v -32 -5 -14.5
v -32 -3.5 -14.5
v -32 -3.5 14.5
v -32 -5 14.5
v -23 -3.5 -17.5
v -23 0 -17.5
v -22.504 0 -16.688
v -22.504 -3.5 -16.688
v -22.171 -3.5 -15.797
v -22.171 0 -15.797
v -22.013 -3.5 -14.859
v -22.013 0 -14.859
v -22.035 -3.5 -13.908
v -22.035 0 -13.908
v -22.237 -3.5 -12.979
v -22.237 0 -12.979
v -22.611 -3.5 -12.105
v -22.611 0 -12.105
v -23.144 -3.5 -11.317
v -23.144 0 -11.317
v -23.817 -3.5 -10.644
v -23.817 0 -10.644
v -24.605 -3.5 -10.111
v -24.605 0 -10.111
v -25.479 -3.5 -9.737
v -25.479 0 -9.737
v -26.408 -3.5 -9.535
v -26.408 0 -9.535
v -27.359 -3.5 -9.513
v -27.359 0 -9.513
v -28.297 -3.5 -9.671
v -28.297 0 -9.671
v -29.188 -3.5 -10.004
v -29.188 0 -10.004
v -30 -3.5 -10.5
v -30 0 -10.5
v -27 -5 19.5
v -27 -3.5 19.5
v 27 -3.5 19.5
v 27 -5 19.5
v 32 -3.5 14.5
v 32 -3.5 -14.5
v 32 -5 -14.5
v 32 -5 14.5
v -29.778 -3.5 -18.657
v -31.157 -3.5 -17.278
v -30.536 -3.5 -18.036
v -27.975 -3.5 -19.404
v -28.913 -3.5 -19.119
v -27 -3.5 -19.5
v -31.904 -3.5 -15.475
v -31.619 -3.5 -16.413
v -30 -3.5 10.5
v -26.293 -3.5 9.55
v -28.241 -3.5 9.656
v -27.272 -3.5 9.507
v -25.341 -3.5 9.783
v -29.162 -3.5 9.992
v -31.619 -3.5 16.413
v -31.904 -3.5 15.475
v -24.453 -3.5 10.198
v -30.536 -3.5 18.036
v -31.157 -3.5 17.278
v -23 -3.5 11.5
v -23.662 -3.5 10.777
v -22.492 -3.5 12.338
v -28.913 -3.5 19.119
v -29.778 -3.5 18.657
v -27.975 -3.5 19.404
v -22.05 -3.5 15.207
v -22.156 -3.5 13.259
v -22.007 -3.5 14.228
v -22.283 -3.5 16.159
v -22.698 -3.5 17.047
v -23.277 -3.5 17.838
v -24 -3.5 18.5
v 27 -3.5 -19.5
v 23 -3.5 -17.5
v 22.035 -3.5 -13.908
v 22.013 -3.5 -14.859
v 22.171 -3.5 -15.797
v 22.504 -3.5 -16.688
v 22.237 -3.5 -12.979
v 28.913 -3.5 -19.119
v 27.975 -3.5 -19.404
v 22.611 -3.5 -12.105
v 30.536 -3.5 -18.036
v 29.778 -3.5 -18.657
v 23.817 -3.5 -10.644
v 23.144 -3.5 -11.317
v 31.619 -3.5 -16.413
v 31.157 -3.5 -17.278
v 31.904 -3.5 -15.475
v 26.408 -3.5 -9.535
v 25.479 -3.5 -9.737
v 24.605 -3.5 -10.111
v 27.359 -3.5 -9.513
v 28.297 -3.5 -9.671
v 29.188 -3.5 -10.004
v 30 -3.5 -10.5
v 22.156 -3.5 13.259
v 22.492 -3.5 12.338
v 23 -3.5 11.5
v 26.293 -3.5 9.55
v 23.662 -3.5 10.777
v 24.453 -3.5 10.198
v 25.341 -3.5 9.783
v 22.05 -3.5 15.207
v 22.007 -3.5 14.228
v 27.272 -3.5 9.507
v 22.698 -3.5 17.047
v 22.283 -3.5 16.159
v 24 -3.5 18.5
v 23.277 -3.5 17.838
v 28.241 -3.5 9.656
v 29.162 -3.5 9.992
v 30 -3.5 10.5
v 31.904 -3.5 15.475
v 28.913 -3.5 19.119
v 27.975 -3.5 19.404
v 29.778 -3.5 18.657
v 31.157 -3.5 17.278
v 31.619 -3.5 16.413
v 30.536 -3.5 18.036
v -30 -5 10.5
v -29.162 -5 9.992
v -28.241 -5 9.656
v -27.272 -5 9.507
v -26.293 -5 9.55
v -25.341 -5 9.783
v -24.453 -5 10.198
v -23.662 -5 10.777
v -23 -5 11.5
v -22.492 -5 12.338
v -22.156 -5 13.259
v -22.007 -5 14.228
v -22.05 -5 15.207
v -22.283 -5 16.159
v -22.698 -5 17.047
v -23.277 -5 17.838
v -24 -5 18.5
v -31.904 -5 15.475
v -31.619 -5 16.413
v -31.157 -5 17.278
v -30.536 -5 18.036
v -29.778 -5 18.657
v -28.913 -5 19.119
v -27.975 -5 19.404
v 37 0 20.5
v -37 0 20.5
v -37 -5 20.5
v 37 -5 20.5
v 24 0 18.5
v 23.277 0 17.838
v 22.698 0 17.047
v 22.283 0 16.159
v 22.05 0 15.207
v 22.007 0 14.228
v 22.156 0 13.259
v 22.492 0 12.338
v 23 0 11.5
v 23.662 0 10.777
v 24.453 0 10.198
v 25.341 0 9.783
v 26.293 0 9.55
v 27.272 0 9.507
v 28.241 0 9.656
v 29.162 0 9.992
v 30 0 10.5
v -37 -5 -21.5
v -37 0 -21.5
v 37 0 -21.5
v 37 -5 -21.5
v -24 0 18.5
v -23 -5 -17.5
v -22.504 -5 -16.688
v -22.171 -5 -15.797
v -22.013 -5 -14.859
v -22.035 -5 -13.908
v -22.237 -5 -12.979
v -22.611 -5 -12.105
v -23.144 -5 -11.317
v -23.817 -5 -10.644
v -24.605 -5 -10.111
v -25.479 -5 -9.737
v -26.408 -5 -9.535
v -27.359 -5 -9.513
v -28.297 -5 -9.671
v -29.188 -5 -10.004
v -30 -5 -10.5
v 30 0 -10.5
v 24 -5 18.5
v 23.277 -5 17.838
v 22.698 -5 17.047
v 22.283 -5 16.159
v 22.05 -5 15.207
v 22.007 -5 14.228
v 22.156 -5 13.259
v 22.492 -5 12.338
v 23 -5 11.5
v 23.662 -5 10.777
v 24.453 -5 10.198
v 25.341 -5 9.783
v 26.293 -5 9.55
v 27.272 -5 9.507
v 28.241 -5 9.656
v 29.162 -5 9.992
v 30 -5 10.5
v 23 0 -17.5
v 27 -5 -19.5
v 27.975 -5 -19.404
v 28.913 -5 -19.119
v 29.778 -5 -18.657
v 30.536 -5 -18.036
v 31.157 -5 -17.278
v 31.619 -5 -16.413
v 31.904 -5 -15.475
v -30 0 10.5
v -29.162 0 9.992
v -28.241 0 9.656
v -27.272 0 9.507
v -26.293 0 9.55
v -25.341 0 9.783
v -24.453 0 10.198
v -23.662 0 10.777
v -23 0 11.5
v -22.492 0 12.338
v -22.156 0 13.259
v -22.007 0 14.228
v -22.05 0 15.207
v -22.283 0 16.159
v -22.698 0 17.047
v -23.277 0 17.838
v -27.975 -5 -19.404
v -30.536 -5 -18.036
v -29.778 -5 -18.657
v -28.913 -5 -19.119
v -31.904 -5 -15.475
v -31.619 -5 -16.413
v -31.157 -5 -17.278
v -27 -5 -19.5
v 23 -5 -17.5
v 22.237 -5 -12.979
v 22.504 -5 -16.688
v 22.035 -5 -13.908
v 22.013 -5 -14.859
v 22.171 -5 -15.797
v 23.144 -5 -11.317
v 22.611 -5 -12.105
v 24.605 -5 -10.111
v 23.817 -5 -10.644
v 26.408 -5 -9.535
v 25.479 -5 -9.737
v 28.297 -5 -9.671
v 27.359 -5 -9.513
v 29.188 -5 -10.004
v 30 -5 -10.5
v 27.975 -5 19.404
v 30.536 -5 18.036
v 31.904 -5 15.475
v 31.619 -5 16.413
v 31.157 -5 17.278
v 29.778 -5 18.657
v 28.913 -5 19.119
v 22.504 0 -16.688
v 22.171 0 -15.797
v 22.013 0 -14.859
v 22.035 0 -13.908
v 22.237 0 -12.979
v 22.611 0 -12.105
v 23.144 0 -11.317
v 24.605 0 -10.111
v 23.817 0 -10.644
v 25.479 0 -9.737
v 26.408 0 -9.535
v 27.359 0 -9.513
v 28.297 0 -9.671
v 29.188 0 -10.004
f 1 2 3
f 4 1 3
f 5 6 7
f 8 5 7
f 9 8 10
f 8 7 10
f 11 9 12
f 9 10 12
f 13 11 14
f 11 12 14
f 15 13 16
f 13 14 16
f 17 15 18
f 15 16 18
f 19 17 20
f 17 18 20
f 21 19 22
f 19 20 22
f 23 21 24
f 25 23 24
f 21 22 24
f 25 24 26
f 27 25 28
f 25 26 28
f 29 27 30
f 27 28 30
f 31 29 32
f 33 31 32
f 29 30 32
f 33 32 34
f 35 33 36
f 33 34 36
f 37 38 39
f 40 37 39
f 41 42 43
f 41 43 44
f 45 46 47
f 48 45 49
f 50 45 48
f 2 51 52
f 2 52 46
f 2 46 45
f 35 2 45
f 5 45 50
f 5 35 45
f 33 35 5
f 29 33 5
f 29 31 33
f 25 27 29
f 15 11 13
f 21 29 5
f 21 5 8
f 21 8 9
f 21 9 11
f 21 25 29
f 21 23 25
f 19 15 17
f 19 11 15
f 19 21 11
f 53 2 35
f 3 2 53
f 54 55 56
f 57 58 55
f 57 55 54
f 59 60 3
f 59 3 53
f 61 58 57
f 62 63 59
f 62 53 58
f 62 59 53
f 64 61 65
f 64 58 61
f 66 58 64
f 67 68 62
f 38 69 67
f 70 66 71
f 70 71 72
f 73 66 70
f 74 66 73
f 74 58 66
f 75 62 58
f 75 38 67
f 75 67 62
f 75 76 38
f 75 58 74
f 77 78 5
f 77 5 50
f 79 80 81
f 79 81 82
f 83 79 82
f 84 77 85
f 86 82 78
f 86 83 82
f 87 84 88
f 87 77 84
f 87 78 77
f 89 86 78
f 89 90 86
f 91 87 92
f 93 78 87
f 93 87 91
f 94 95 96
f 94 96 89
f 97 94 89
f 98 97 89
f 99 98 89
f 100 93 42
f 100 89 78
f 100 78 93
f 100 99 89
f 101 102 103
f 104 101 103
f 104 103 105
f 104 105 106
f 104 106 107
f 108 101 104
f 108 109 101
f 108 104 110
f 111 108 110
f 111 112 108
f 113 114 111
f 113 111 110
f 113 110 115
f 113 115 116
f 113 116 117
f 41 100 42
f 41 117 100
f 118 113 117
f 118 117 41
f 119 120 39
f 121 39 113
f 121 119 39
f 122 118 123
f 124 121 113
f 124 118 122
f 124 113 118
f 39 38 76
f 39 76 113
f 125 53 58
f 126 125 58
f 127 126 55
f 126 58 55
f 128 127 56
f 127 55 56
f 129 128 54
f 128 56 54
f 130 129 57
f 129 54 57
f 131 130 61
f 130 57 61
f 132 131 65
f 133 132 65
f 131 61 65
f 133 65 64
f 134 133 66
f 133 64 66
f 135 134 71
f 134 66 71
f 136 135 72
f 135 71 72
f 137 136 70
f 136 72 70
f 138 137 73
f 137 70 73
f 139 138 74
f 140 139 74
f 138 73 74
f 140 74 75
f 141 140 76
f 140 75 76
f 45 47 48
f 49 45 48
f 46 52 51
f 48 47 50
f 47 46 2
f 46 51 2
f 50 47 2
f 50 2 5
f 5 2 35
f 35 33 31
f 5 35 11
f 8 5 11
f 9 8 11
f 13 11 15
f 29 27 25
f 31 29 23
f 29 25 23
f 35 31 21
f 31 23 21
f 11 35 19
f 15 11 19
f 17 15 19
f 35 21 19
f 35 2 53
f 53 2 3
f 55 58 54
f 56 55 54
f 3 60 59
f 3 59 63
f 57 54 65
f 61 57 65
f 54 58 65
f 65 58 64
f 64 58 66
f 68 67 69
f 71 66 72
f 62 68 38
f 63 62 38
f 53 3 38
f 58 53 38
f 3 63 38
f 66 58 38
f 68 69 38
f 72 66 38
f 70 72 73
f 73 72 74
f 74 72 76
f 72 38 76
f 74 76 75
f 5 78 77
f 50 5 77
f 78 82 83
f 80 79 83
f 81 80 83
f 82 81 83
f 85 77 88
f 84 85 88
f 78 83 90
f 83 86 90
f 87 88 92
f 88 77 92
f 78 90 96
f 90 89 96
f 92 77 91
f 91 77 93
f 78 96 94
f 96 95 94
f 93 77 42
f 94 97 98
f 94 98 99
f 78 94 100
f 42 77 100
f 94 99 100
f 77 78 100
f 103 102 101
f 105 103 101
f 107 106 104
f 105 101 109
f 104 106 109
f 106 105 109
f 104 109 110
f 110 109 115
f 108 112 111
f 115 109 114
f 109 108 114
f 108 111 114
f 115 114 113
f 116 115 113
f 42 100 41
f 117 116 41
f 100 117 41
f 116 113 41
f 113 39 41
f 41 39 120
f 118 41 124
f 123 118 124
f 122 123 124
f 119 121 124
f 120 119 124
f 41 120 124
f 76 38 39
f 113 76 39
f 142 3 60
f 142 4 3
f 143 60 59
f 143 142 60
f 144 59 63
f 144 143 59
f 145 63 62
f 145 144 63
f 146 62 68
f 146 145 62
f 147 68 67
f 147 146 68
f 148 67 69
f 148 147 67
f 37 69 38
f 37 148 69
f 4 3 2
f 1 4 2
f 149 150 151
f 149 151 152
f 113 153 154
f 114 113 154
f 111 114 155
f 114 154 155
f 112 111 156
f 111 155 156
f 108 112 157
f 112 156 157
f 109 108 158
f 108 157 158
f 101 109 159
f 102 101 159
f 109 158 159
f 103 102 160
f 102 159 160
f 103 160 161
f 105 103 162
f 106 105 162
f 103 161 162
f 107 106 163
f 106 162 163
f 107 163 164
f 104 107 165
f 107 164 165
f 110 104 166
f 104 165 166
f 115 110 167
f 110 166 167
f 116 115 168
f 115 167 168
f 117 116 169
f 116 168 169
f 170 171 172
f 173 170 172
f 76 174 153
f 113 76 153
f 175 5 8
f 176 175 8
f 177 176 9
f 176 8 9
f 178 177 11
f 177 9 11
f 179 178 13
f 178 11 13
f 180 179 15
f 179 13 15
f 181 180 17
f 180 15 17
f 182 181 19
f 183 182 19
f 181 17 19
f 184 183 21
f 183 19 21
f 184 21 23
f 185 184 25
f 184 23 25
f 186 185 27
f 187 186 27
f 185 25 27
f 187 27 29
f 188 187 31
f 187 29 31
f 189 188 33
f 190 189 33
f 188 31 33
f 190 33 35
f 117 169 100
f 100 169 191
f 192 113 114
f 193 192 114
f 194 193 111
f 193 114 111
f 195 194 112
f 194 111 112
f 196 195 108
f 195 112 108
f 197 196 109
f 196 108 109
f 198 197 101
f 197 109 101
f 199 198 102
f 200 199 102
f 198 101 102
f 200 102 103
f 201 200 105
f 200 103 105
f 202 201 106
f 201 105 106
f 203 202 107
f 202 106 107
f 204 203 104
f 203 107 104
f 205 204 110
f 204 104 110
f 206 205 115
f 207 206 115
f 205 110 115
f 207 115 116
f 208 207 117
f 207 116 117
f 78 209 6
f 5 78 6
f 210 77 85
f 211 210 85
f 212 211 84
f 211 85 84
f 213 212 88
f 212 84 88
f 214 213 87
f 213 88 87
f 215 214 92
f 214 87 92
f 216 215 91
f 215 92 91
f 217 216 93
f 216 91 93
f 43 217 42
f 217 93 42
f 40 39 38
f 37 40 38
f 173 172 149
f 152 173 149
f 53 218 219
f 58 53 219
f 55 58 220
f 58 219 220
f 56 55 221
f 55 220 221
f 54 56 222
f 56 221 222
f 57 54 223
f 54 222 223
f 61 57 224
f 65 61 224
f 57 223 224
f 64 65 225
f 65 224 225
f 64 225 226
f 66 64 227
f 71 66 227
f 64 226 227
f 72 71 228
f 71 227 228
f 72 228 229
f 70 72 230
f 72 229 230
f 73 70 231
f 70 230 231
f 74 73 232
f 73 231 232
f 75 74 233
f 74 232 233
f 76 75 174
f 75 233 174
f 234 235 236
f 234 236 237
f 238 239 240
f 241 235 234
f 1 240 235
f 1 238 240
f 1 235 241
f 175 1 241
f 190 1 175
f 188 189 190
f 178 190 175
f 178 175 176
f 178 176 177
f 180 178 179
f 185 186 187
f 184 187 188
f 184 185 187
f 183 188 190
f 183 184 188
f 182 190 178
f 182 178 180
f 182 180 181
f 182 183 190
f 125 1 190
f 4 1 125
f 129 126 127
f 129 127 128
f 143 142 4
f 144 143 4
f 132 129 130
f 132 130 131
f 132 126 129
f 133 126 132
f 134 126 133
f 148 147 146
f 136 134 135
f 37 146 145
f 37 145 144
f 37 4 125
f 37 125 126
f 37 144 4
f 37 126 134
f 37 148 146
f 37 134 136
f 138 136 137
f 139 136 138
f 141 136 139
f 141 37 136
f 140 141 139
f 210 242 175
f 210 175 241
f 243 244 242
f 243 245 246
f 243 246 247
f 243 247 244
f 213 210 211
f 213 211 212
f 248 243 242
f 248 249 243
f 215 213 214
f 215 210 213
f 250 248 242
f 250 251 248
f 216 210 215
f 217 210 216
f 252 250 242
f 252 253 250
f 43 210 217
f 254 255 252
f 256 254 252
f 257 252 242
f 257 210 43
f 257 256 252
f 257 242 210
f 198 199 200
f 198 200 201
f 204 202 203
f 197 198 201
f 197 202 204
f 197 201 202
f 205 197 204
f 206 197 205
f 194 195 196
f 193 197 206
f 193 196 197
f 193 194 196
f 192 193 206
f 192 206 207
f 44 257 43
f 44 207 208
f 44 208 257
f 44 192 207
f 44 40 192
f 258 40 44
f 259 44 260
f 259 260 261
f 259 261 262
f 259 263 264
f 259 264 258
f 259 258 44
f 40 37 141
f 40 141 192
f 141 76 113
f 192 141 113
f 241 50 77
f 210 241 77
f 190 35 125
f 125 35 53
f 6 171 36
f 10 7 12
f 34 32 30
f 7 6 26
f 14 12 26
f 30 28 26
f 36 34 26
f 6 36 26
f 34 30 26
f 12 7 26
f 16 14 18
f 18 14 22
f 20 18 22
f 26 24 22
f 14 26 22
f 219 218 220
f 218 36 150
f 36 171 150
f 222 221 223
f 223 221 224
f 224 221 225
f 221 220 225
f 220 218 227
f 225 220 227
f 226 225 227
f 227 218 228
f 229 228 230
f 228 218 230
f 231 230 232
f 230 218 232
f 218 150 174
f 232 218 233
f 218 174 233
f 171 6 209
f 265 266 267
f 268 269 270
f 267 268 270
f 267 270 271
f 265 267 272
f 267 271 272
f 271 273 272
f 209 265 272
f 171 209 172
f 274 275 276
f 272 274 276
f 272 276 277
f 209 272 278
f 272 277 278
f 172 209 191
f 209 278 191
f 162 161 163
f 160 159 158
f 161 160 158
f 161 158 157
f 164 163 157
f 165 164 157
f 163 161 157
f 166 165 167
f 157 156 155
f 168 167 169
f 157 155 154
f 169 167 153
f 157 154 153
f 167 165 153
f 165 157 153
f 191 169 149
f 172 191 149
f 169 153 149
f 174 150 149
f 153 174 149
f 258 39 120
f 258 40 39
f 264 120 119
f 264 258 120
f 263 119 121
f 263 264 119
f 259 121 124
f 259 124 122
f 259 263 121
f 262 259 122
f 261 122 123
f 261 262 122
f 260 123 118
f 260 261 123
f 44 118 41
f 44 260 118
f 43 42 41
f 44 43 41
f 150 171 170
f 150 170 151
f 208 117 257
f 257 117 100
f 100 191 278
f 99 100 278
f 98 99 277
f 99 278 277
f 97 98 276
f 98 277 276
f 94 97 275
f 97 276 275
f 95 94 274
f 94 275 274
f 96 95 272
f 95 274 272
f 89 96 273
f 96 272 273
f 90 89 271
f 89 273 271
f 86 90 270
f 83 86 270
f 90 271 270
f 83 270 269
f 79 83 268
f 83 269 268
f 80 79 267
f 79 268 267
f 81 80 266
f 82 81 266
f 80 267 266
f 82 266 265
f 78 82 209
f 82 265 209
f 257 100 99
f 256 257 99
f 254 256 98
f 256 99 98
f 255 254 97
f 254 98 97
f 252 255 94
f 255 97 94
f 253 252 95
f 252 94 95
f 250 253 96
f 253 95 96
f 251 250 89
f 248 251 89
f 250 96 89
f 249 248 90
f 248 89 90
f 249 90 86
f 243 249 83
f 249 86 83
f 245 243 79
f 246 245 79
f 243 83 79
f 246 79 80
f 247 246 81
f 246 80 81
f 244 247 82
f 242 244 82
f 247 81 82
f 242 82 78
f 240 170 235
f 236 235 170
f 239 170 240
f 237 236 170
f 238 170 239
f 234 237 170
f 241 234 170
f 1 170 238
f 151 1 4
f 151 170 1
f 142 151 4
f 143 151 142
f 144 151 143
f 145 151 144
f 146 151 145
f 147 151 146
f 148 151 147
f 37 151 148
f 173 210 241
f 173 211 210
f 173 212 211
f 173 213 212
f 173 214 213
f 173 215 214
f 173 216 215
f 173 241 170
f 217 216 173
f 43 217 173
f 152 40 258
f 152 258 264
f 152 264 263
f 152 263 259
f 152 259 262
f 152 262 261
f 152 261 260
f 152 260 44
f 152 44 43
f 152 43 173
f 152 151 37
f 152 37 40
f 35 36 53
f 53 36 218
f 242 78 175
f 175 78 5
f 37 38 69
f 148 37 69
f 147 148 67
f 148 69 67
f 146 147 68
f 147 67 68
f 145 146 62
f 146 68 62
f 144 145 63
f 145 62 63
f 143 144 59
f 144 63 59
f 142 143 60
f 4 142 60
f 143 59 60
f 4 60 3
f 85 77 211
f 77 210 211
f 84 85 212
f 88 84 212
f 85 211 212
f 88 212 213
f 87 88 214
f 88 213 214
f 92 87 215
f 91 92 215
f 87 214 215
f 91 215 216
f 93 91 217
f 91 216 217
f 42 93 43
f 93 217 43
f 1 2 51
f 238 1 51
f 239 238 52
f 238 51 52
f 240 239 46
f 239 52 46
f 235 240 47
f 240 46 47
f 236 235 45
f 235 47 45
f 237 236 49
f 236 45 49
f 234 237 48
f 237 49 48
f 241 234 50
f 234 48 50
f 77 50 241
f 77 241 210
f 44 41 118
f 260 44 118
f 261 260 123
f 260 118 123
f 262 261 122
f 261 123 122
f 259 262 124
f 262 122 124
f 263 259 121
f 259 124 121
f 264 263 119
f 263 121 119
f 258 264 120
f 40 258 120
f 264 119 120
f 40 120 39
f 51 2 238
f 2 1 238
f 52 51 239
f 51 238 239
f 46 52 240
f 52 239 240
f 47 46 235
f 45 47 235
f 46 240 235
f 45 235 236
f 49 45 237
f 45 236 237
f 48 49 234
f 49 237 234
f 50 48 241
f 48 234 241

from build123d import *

# Parameters (mm, degrees)
F0_W     = 74
F0_H     = 42
F0_W_2   = 64
F0_H_2   = 39
F1_DEPTH = 5
F2_DEPTH = 3.5
F3_R     = 5
F4_DEPTH = 1.5


with BuildPart() as f1:
    # F0 (on Front) → F1 (new body)
    with BuildSketch(Plane.XZ):
        with Locations((0, -0.5)):
            Rectangle(F0_W, F0_H)
        Rectangle(F0_W_2, F0_H_2, mode=Mode.SUBTRACT)
    extrude(amount=F1_DEPTH)

    # F0 (on Front) → F2 (join)
    with BuildSketch(Plane.XZ):
        Rectangle(F0_W_2, F0_H_2)
        with BuildLine():
            Line((-30, -10.5), (-30, 10.5))
            ThreePointArc((-30, 10.5), (-23, 11.5), (-24, 18.5))
            Line((-24, 18.5), (24, 18.5))
            ThreePointArc((24, 18.5), (23, 11.5), (30, 10.5))
            Line((30, 10.5), (30, -10.5))
            ThreePointArc((30, -10.5), (23.464466, -10.964466), (23, -17.5))
            Line((23, -17.5), (-23, -17.5))
            ThreePointArc((-23, -17.5), (-23.464466, -10.964466), (-30, -10.5))
        make_face(mode=Mode.SUBTRACT)
    extrude(amount=F2_DEPTH)

    # F3
    f3_edges = [f1.edges().sort_by_distance(p)[0] for p in [
        (-32, -4.25, 19.5),
        (-32, -4.25, -19.5),
        (32, -4.25, -19.5),
        (32, -4.25, 19.5),
    ]]
    fillet(f3_edges, radius=F3_R)


with BuildPart() as f4:
    # F2_face (on face) → F4 (new body)
    with BuildSketch(Plane(origin=(0, -3.5, -1.52285), x_dir=(1, 0, 0), z_dir=(0, -1, 0))):
        with BuildLine():
            Line((27, 21.02285), (-27, 21.02285))
            ThreePointArc((-27, 21.02285), (-30.535534, 19.558384), (-32, 16.02285))
            Line((-32, 16.02285), (-32, -12.97715))
            ThreePointArc((-32, -12.97715), (-30.535534, -16.512684), (-27, -17.97715))
            Line((-27, -17.97715), (27, -17.97715))
            ThreePointArc((27, -17.97715), (30.535534, -16.512684), (32, -12.97715))
            Line((32, -12.97715), (32, 16.02285))
            ThreePointArc((32, 16.02285), (30.535534, 19.558384), (27, 21.02285))
        make_face()
        with BuildLine():
            Line((-30, -8.97715), (-30, 12.02285))
            ThreePointArc((-30, 12.02285), (-23, 13.02285), (-24, 20.02285))
            Line((-24, 20.02285), (24, 20.02285))
            ThreePointArc((24, 20.02285), (23, 13.02285), (30, 12.02285))
            Line((30, 12.02285), (30, -8.97715))
            ThreePointArc((30, -8.97715), (23.464466, -9.441616), (23, -15.97715))
            Line((23, -15.97715), (-23, -15.97715))
            ThreePointArc((-23, -15.97715), (-23.464466, -9.441616), (-30, -8.97715))
        make_face(mode=Mode.SUBTRACT)
    extrude(amount=F4_DEPTH)


solid = Compound([f1.part, f4.part])
